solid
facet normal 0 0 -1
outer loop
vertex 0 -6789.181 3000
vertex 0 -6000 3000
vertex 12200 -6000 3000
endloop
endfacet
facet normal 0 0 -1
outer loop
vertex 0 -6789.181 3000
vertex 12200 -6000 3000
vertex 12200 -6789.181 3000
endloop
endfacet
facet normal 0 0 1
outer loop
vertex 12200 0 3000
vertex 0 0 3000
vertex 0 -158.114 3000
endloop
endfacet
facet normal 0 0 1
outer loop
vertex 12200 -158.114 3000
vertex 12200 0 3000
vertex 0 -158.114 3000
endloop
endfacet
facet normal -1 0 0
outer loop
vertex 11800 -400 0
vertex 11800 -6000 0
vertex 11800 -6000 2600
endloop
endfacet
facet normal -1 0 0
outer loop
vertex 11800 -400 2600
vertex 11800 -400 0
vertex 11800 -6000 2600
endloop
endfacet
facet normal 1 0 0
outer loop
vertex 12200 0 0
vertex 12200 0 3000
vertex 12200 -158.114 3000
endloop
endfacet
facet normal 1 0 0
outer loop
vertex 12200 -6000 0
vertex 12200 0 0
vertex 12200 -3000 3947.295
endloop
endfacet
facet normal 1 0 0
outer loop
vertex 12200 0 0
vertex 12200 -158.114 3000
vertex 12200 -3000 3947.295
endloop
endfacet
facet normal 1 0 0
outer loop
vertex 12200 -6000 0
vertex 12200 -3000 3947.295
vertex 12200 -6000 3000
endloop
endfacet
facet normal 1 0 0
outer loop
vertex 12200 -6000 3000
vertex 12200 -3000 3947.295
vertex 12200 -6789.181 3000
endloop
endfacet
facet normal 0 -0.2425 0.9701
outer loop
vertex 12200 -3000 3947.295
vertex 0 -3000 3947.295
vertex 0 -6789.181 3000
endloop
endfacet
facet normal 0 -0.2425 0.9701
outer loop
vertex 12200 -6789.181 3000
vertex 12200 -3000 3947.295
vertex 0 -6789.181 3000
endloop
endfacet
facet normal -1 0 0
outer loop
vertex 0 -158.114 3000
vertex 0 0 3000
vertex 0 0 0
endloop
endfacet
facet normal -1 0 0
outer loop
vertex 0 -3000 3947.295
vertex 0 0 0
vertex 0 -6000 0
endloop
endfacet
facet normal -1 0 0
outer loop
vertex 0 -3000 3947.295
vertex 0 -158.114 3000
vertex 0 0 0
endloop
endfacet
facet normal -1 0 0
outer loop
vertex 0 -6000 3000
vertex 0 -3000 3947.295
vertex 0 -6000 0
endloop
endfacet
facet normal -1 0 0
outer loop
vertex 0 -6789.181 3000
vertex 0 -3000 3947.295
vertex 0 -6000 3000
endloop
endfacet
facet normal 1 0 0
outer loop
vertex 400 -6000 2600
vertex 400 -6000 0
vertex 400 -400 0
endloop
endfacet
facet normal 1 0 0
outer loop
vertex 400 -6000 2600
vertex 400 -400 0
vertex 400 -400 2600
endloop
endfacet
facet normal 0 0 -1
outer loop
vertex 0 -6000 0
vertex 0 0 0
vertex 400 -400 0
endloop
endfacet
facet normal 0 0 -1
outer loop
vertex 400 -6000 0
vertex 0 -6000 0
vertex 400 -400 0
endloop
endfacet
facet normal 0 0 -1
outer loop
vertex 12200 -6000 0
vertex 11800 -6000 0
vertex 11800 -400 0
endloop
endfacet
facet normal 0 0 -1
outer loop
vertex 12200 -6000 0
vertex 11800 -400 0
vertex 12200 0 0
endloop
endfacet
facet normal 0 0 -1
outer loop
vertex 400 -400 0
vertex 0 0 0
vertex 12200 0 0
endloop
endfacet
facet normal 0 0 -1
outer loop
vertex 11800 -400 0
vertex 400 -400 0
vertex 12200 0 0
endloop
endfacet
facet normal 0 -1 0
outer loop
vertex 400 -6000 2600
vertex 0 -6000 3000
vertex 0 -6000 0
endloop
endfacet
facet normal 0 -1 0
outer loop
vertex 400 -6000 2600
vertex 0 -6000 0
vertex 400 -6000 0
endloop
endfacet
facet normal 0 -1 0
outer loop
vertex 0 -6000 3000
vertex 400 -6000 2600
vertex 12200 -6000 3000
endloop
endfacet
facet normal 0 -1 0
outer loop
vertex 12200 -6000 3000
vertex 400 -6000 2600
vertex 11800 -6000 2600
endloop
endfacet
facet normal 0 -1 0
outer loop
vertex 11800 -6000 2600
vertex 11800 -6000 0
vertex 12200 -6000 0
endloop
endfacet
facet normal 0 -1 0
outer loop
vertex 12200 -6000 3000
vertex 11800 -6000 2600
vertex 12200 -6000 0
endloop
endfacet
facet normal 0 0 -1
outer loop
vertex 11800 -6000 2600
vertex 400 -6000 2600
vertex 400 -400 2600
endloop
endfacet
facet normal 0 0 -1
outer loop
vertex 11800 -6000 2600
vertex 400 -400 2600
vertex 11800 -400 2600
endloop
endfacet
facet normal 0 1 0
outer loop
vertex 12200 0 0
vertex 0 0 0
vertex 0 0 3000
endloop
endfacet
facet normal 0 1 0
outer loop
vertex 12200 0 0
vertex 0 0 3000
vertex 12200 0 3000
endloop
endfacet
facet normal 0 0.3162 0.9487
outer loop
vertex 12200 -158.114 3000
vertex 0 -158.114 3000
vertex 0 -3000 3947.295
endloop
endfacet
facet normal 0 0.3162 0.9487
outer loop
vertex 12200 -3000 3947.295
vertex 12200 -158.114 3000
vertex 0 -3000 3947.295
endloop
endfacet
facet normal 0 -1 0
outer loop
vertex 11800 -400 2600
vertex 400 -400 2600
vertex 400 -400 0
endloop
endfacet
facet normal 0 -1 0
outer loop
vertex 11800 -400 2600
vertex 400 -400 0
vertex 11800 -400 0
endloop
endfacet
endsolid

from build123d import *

# Parameters (mm, degrees)
F0_W     = 12200
F0_H     = 6000
F1_DEPTH = 3000
F3_DEPTH = 12200
F4_W     = 11400
F4_H     = 2600
F5_DEPTH = 5600
F7_DEPTH = 18300


with BuildPart() as f1:
    # F0 (on Top) → F1 (new body)
    with BuildSketch(Plane.XY):
        with Locations((6100, -3000)):
            Rectangle(F0_W, F0_H)
    extrude(amount=F1_DEPTH)

    # F2 (on face) → F3 (join)
    with BuildSketch(Plane(origin=(0, 0, 0), x_dir=(0, -1, 0), z_dir=(-1, 0, 0))):
        Polygon((3000, 4000), (0, 3000), (7000, 3000), align=None)
    extrude(amount=-F3_DEPTH)

    # F4 (on face) → F5 (cut)
    with BuildSketch(Plane.XZ.offset(6000)):
        with Locations((6100, 1300)):
            Rectangle(F4_W, F4_H)
    extrude(amount=-F5_DEPTH, mode=Mode.SUBTRACT)

    # F6 (on face) → F7 (cut)
    with BuildSketch(Plane(origin=(0, 0, 0), x_dir=(0, -1, 0), z_dir=(-1, 0, 0))):
        Polygon((3000, 4000), (0, 3000), (158.113883, 3000), (3000, 3947.295372), (6789.181489, 3000), (7000, 3000), align=None)
    extrude(amount=-F7_DEPTH, mode=Mode.SUBTRACT)


solid = f1.part
